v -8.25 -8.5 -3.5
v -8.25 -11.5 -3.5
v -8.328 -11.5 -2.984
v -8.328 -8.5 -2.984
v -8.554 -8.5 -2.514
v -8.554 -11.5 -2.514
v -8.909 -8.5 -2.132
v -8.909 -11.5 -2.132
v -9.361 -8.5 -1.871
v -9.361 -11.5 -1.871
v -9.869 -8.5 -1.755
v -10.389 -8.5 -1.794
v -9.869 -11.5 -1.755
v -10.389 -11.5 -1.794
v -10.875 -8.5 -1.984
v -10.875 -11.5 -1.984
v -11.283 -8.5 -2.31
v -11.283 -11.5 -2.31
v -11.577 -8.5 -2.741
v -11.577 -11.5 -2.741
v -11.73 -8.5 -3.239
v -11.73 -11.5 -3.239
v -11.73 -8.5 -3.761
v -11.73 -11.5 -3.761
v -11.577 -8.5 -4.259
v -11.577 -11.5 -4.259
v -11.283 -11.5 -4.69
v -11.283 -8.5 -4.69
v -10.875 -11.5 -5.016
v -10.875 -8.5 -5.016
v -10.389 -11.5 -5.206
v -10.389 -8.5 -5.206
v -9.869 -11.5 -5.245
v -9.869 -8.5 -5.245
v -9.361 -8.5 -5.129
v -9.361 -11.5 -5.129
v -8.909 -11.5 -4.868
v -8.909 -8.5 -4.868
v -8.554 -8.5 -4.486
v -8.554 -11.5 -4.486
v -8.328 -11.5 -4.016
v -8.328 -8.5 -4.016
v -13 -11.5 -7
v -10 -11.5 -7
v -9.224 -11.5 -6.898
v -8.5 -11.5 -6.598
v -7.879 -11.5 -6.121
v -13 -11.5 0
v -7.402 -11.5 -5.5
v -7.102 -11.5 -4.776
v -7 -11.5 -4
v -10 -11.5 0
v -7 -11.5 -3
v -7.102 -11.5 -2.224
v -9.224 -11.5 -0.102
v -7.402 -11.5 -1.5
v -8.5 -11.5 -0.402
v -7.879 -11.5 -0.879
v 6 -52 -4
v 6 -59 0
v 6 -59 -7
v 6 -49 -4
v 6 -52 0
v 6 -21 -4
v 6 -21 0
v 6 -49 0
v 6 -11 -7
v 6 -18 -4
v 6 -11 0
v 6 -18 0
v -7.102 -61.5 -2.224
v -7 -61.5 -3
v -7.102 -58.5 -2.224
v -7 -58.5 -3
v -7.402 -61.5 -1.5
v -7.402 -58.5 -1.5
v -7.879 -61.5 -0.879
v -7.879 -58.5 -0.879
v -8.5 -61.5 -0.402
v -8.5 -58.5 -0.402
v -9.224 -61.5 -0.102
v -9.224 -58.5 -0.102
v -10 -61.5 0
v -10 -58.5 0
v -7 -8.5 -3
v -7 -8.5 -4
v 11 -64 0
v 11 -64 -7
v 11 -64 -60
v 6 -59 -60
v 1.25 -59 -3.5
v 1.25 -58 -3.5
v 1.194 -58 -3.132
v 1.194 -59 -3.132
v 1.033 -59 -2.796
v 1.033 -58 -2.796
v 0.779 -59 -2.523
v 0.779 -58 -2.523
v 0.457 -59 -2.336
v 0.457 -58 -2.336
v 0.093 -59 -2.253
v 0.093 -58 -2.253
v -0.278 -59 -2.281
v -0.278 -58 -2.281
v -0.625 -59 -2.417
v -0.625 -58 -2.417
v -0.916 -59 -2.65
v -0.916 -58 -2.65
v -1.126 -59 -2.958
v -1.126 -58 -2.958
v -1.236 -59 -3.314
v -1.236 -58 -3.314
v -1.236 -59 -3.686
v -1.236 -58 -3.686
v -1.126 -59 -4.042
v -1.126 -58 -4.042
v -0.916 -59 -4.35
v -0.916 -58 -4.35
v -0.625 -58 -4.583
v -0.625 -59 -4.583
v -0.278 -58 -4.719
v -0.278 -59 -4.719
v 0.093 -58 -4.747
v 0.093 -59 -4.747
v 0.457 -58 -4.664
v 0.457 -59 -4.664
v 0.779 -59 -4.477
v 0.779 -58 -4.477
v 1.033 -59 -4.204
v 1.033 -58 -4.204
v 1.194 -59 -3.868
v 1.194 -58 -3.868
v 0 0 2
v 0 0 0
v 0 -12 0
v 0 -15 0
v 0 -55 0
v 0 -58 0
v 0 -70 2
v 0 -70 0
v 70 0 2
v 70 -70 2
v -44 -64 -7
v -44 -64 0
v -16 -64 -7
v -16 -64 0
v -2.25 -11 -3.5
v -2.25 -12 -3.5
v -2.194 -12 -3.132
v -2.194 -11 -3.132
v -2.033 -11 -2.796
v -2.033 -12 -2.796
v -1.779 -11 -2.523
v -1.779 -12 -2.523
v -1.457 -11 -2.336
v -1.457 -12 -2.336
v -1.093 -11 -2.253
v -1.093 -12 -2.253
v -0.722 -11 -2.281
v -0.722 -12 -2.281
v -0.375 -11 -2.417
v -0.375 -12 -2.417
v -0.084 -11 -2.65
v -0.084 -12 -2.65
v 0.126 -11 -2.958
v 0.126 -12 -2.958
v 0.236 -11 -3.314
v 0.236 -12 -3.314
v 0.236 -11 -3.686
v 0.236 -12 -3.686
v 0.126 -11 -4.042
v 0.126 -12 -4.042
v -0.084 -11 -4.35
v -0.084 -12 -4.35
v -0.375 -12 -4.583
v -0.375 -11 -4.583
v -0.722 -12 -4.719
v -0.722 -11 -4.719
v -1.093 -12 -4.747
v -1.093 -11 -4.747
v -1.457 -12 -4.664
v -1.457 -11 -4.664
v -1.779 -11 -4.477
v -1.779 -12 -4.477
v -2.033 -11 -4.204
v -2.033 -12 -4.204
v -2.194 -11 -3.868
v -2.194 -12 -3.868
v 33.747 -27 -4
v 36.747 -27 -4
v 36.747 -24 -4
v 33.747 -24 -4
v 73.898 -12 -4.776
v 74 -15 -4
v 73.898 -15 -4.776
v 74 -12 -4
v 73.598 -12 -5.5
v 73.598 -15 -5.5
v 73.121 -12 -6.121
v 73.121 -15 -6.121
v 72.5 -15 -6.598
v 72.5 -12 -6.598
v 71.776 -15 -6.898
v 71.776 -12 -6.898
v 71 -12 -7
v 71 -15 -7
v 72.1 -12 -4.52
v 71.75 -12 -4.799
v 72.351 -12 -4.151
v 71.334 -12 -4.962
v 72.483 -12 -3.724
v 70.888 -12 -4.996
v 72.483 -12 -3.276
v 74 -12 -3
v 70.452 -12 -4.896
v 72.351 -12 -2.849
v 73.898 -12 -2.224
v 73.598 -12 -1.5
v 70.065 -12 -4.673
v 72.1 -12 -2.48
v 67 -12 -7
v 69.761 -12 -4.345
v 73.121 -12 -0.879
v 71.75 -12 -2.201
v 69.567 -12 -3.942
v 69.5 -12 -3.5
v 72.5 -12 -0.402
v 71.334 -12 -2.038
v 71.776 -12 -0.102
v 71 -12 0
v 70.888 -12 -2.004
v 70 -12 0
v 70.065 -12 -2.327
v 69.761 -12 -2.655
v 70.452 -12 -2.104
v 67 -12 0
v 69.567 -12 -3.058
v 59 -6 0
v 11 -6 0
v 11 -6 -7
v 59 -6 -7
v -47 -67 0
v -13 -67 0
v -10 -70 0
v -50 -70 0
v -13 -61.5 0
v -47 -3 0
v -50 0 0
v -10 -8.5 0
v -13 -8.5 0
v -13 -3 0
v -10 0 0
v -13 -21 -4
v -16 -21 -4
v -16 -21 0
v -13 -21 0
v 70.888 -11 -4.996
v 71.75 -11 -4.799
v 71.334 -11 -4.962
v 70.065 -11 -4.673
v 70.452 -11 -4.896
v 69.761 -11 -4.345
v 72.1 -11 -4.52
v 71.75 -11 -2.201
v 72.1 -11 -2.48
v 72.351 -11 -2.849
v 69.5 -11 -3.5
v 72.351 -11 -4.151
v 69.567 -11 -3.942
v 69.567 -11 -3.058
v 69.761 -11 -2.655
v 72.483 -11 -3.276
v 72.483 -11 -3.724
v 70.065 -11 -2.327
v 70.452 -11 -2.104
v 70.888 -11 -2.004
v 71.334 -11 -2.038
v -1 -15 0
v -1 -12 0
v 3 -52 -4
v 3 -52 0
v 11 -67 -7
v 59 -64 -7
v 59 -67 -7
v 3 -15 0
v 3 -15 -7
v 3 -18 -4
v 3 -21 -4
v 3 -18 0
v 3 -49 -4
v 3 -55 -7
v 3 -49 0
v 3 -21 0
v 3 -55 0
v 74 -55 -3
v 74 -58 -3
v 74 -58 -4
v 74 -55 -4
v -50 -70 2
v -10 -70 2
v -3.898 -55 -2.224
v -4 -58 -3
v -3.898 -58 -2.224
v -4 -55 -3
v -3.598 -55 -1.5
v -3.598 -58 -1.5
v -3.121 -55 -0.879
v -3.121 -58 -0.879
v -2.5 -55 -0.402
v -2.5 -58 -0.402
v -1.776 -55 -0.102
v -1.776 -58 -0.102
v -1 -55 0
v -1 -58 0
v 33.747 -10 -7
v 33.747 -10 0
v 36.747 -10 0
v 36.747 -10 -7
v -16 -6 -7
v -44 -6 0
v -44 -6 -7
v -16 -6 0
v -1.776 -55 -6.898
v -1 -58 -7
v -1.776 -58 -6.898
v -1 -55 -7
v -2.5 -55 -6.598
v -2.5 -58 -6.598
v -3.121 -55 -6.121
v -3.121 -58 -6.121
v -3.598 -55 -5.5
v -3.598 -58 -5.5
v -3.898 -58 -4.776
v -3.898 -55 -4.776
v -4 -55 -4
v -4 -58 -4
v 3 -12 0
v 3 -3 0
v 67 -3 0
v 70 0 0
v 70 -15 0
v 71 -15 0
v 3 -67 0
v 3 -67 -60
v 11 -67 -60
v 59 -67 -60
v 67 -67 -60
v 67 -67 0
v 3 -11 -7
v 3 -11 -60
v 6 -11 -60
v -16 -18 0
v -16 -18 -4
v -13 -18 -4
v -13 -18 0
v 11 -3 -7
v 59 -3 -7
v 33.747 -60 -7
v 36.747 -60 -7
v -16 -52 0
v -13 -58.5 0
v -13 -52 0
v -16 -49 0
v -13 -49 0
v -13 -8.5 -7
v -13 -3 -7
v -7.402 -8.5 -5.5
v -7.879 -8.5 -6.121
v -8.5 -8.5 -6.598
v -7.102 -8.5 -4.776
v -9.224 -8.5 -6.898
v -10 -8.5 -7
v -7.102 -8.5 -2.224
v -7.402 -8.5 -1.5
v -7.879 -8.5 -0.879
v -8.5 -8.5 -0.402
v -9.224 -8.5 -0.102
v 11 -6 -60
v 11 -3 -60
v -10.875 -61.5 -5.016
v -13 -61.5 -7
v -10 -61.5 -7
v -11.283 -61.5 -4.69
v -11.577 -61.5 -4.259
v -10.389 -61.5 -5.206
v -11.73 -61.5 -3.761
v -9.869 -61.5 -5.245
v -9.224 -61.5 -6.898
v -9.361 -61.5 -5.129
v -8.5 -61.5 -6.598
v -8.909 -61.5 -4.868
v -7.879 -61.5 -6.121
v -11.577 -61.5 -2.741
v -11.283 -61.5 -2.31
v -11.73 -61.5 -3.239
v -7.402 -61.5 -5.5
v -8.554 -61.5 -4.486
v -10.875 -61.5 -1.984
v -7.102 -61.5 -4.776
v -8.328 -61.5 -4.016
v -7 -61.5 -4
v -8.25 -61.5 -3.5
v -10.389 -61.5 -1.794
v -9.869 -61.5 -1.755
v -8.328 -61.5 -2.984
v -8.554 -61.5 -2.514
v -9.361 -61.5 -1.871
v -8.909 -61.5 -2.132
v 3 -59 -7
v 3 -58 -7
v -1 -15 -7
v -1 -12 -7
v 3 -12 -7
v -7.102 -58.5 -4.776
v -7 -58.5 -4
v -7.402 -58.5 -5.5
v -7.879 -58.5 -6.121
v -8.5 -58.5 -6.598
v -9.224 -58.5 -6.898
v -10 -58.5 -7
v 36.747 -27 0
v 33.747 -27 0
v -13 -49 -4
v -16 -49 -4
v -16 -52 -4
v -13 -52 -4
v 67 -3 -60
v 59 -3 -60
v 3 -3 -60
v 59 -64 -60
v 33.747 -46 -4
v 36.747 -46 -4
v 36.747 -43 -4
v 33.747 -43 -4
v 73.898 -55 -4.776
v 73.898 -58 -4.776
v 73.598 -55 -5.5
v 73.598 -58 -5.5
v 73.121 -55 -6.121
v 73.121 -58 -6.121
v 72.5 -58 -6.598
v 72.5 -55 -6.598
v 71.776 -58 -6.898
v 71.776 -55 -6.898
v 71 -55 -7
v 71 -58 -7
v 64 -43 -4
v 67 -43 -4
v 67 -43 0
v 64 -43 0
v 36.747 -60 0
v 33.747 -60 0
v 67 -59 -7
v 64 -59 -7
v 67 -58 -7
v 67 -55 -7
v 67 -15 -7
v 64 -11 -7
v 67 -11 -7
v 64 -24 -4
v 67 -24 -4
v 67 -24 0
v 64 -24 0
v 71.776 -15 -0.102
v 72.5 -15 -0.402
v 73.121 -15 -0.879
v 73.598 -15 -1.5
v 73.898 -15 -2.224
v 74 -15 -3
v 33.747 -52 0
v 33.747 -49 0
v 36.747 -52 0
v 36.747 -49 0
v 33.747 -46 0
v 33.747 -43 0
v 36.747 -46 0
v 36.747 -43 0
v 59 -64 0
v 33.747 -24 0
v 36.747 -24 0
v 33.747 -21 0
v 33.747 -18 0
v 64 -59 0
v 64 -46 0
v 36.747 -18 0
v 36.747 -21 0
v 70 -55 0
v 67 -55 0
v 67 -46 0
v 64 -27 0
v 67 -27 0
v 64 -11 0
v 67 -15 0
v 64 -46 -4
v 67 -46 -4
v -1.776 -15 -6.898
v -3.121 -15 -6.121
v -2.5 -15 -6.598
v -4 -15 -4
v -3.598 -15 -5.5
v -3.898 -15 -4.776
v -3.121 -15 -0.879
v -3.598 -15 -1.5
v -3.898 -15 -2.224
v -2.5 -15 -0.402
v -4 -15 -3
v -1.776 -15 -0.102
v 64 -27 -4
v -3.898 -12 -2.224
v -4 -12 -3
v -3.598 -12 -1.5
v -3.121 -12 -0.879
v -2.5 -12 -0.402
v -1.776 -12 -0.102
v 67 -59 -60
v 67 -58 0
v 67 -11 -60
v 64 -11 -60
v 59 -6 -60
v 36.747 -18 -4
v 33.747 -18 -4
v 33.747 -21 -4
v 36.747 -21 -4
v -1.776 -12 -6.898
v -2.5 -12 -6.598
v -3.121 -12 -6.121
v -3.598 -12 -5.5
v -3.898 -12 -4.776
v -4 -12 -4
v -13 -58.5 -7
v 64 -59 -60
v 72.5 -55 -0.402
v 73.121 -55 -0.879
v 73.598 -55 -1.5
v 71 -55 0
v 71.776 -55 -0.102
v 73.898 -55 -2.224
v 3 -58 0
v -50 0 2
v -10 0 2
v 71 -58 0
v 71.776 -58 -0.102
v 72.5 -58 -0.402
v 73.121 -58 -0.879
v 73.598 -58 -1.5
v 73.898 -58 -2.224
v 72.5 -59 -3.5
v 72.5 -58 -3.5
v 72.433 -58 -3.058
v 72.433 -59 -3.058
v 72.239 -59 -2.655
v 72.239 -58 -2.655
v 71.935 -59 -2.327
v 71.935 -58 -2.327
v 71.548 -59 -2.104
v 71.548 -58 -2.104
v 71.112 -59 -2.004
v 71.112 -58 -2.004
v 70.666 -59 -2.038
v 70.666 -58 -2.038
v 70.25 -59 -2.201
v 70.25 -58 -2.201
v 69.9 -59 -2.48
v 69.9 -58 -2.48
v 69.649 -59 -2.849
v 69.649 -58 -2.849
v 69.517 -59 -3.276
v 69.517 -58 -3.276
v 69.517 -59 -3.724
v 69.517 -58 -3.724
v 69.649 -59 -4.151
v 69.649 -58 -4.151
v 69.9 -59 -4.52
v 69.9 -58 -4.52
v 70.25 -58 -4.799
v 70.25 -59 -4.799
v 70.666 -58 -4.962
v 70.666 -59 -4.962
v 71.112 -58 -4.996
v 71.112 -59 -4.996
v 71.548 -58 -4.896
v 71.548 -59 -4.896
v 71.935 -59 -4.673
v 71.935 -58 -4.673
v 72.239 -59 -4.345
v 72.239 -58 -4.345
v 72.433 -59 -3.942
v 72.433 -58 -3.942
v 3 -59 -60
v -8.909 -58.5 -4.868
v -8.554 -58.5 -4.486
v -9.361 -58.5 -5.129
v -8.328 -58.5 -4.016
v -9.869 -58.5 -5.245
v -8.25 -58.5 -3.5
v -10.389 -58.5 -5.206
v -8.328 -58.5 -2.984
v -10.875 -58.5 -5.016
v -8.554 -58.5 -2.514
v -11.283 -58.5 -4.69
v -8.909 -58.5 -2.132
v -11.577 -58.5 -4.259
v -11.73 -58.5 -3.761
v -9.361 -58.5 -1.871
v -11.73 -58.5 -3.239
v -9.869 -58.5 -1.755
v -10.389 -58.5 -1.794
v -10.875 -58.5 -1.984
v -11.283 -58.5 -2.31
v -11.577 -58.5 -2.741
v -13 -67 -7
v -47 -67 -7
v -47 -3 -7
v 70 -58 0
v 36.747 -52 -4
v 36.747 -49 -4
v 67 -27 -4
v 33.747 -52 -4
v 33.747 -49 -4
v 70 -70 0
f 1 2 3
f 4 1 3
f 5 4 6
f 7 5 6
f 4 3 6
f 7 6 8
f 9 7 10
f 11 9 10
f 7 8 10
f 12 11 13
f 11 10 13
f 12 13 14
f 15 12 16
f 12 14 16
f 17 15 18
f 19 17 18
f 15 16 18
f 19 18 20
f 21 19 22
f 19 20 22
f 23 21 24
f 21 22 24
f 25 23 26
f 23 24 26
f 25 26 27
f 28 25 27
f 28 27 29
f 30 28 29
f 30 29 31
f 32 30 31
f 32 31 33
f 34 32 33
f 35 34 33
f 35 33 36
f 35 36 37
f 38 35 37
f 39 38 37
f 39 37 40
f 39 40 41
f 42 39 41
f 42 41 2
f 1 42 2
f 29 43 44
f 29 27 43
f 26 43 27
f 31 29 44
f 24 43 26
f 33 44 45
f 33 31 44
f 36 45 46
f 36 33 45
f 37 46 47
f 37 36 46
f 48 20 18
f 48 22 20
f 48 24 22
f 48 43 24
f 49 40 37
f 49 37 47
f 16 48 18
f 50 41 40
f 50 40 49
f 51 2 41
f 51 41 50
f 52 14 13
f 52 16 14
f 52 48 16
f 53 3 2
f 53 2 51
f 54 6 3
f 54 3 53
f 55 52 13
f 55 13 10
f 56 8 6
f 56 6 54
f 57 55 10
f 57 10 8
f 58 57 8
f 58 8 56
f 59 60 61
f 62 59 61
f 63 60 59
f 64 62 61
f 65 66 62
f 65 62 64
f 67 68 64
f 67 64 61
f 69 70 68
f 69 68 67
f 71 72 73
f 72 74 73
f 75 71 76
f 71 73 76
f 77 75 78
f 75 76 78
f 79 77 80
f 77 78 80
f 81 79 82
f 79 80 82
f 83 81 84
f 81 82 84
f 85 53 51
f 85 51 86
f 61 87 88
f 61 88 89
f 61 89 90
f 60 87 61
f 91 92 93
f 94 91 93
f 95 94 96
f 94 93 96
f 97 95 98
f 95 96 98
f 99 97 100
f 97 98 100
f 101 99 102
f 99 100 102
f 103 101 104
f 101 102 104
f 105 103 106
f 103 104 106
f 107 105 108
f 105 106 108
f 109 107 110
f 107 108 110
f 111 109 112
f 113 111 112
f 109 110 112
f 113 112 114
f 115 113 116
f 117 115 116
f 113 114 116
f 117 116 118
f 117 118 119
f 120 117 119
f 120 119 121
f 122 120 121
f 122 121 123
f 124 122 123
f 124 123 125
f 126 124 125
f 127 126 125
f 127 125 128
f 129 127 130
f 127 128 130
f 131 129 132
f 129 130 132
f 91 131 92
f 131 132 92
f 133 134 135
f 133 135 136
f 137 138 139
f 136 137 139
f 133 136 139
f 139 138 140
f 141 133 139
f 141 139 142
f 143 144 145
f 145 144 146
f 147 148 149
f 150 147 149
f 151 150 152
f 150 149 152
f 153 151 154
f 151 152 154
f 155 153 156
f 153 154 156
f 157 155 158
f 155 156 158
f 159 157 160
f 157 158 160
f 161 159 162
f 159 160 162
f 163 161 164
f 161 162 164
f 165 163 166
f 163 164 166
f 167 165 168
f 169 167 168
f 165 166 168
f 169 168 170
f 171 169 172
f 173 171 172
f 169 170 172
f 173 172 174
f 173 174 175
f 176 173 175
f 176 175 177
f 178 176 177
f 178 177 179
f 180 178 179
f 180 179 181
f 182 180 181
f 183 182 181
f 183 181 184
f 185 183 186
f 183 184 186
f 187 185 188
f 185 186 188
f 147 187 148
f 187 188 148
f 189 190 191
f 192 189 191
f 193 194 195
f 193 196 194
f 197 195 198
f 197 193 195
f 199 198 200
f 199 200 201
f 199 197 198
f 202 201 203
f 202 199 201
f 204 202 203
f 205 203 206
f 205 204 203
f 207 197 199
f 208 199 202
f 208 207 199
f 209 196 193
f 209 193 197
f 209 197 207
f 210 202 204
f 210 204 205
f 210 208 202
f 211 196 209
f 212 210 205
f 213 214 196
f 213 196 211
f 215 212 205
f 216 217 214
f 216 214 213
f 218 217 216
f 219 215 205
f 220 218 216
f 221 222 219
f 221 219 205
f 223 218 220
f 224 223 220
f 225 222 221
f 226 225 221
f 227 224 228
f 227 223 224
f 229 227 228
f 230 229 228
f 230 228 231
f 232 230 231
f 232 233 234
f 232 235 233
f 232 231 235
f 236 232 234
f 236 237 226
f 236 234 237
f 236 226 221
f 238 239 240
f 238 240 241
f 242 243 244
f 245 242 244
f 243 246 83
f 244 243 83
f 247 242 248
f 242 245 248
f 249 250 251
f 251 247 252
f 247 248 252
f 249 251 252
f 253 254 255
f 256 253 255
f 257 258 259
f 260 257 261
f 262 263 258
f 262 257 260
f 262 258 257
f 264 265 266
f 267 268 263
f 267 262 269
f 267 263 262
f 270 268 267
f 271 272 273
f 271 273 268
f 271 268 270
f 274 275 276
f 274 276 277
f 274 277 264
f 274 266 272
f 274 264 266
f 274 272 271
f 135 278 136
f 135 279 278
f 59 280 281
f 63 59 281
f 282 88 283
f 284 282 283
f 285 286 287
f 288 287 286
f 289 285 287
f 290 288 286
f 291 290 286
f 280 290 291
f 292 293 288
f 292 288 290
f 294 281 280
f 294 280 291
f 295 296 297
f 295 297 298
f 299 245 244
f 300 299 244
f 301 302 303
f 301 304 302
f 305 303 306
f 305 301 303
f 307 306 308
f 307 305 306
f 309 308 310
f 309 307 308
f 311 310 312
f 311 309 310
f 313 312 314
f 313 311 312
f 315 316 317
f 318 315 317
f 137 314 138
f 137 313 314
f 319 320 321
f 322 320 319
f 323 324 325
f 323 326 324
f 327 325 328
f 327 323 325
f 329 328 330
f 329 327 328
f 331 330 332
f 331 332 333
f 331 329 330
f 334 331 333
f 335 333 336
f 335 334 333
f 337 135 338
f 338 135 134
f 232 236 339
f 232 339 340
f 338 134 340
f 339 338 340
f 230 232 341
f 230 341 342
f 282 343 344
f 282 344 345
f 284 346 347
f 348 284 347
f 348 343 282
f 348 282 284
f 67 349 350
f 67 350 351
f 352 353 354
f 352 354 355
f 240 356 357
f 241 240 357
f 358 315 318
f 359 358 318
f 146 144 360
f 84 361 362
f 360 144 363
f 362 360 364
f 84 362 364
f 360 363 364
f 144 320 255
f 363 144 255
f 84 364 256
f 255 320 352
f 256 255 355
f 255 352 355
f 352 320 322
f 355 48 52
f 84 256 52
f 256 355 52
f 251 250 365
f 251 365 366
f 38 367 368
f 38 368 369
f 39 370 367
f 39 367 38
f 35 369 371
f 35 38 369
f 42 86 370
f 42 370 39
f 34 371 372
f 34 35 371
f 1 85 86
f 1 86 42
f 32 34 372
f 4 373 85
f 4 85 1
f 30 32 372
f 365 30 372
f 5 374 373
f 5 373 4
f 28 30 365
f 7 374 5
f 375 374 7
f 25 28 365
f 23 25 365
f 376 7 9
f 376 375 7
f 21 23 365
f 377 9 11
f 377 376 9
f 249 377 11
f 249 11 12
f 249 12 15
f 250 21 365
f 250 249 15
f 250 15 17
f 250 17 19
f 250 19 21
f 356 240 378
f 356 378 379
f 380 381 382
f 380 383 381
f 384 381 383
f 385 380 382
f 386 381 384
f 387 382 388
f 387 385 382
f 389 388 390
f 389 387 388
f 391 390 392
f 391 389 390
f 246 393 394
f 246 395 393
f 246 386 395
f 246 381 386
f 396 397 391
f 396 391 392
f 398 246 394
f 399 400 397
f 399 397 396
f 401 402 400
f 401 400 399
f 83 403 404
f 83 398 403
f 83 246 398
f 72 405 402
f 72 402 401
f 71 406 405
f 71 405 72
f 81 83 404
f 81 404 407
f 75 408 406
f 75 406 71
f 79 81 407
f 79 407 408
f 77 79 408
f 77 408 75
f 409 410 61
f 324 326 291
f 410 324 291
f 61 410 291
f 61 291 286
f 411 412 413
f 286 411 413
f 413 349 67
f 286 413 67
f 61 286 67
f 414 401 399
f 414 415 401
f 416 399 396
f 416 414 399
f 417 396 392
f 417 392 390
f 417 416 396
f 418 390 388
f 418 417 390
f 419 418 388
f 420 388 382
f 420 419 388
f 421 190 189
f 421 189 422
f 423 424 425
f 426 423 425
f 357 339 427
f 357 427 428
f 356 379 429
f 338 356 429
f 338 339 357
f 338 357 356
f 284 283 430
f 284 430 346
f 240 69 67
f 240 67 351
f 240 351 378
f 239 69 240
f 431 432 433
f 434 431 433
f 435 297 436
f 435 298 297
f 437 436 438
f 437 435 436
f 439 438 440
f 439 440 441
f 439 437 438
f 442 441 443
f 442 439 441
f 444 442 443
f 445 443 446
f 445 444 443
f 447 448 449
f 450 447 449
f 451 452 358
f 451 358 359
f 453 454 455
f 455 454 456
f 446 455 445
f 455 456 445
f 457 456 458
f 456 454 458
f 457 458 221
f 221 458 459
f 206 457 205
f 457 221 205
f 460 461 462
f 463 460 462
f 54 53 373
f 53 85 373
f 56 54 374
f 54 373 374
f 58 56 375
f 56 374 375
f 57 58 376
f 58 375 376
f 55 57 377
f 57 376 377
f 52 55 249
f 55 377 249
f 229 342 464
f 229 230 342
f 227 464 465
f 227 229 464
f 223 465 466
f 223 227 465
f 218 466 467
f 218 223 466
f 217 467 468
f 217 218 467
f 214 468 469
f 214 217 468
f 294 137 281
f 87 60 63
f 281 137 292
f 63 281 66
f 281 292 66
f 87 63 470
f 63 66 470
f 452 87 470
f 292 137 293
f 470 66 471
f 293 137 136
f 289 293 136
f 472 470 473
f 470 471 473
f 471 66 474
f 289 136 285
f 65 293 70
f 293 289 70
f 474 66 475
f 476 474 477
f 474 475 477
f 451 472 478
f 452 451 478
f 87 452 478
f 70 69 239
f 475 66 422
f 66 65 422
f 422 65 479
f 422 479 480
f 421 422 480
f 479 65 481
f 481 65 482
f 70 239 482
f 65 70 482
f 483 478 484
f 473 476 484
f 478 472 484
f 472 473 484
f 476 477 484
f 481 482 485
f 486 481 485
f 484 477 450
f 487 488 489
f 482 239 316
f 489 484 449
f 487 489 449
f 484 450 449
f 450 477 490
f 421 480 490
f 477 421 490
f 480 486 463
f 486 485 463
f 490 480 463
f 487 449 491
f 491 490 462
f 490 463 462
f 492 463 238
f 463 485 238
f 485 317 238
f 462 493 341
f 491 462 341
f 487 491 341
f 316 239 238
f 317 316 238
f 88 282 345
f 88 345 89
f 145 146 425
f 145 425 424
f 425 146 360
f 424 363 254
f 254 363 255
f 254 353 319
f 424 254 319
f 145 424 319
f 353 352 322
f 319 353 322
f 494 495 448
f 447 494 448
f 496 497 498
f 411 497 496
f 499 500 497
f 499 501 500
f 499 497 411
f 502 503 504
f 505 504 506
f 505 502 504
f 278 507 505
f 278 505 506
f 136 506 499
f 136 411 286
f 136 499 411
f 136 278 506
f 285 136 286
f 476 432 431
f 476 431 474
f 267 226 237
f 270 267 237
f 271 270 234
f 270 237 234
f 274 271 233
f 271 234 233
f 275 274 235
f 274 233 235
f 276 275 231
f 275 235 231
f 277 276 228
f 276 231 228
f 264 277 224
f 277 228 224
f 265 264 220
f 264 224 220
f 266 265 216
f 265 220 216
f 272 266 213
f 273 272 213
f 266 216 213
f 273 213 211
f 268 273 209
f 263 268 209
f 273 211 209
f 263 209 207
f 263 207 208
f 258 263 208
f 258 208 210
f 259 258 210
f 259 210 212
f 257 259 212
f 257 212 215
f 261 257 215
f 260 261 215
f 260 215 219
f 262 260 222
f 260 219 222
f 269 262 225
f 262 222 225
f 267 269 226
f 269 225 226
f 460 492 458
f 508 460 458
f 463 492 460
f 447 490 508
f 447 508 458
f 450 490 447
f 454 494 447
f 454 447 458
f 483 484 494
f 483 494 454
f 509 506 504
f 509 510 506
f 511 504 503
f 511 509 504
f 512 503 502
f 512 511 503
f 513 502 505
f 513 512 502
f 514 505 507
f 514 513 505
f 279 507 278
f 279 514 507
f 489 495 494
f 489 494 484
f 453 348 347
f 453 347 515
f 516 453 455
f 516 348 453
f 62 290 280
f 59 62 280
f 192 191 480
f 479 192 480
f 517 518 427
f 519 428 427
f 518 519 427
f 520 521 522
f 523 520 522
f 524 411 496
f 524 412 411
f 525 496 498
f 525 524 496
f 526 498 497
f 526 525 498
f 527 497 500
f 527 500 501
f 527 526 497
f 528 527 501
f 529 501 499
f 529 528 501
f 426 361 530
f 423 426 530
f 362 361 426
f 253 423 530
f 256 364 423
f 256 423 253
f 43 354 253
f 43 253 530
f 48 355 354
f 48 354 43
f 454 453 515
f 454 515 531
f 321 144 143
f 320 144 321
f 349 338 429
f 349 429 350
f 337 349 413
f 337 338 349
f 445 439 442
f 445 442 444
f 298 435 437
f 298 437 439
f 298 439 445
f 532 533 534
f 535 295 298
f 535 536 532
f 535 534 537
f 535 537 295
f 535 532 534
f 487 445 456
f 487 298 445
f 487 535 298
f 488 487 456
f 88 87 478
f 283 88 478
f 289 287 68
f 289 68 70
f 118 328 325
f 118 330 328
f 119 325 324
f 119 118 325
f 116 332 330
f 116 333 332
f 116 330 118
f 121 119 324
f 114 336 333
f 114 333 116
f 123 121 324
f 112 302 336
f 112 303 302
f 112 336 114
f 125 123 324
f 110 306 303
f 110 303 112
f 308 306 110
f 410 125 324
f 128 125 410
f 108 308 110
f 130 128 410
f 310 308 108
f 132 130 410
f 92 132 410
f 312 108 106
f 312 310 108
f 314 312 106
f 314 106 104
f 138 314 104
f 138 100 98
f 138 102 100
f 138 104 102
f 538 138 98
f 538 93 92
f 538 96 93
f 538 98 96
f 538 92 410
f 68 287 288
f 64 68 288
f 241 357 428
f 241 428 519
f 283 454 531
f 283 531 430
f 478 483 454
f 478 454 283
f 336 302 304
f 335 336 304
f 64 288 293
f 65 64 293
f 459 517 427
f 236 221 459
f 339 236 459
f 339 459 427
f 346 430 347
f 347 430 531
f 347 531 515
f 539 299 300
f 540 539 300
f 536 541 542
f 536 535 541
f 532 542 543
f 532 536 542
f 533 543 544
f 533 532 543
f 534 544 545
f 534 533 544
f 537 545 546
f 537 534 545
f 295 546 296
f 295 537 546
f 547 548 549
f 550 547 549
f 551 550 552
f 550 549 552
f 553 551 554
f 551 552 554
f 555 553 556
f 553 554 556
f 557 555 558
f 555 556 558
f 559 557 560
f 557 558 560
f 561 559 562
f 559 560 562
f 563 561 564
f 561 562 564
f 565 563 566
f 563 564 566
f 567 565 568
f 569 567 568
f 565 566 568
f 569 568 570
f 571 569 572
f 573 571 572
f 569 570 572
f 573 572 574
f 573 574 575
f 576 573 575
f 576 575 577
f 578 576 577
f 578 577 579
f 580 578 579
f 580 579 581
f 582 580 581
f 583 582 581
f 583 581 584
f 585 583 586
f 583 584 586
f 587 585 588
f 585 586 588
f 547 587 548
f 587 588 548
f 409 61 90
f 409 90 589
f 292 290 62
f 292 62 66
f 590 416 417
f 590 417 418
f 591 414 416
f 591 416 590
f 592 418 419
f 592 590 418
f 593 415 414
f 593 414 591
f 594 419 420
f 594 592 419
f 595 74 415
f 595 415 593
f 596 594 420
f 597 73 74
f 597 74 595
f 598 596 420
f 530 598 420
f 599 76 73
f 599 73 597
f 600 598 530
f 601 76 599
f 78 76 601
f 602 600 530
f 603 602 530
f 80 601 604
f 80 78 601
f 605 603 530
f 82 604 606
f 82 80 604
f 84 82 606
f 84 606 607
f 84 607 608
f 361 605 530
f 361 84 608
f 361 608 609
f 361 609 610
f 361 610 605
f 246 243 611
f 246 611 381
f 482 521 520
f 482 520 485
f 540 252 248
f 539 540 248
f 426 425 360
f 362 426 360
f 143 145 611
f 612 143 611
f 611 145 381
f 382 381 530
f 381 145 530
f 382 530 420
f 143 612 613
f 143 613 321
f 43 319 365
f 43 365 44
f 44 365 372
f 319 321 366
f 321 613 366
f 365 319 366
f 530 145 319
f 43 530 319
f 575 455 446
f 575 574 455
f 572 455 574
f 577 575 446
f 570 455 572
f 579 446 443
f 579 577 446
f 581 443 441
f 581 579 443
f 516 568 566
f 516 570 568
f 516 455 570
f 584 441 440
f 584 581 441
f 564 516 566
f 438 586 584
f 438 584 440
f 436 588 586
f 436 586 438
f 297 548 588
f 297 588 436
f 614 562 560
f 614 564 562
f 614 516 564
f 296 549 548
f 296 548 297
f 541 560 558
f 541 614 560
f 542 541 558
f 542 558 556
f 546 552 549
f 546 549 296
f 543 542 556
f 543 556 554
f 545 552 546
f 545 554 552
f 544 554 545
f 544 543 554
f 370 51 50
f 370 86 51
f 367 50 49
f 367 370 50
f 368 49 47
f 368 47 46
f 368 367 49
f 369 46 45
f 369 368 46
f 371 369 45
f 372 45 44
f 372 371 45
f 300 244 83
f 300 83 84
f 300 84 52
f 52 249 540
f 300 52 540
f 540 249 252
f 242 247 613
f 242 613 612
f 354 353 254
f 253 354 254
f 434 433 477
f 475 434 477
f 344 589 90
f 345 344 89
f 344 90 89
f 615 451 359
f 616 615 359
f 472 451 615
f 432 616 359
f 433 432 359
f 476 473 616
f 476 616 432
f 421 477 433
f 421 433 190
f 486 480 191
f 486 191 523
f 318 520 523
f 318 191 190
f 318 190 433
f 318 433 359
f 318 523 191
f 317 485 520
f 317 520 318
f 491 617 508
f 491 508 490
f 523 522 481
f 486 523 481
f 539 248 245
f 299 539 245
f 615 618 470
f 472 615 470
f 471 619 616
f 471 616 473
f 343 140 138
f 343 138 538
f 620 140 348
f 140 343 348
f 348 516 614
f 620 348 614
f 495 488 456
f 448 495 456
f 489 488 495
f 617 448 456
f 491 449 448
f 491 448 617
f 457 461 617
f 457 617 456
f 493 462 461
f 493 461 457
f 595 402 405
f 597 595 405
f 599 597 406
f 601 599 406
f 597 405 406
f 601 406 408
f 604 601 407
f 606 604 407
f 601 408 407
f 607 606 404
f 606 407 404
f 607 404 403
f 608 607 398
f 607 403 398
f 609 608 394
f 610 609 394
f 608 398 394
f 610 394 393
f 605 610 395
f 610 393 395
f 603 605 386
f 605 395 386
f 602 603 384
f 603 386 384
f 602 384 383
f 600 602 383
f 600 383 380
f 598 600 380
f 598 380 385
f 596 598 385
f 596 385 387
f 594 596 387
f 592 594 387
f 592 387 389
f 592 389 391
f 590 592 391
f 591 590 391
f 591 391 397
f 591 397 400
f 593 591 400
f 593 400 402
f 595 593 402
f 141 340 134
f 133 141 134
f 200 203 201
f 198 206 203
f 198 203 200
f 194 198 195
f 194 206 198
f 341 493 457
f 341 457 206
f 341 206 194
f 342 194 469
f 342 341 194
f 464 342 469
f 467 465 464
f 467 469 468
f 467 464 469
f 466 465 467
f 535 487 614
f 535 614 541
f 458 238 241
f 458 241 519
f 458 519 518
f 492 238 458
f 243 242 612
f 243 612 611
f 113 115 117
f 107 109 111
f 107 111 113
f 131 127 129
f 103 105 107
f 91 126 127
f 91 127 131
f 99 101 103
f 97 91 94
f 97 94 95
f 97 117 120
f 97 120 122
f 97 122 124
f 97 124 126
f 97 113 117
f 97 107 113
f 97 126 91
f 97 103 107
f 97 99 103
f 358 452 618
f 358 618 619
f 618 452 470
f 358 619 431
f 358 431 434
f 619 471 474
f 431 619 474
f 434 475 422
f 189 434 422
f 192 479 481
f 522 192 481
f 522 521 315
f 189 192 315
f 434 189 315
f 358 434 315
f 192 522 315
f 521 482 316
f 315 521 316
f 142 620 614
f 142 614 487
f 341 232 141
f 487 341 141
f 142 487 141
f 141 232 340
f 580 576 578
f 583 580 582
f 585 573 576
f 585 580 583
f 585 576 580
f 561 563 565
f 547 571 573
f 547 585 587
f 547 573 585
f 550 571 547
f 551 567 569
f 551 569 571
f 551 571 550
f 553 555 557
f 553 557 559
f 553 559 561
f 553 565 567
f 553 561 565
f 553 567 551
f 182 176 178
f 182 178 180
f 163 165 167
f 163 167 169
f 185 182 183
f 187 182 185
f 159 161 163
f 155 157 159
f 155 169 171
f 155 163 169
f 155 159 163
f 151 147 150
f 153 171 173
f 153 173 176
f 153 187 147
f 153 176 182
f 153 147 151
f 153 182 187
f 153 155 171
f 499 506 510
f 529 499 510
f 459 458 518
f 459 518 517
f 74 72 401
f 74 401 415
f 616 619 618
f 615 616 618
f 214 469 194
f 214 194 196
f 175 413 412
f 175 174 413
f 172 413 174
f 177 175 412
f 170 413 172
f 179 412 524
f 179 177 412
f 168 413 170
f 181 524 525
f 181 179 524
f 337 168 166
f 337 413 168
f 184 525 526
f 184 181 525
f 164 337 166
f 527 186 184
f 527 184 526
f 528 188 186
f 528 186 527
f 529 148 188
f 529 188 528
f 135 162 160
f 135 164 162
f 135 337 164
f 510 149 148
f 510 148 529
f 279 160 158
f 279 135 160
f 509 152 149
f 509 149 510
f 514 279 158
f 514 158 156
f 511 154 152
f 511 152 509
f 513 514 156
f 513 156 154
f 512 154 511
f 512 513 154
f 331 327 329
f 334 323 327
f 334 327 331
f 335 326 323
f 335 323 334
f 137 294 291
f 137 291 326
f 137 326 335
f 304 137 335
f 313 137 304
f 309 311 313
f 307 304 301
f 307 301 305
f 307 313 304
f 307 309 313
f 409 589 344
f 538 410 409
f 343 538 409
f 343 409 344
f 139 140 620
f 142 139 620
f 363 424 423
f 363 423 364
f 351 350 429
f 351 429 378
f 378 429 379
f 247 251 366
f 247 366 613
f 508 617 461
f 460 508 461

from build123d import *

# Parameters (mm, degrees)
F0_W      = 3
F0_H      = 50
F0_W_2    = 48
F0_H_2    = 3
F0_H_3    = 40
F1_DEPTH  = 2
F2_DEPTH  = 60
F0_W_3    = 4
F3_DEPTH  = 7
F4_R      = 1.25
F4_R_2    = 1.5
F5_DEPTH  = 1
F6_R      = 1.25
F6_R_2    = 1.5
F7_DEPTH  = 1
F8_W      = 28
F8_H      = 58
F8_W_2    = 3
F8_H_2    = 47
F8_H_3    = 3
F9_DEPTH  = 2
F10_DEPTH = 7
F11_DEPTH = 7
F12_R     = 1.75
F13_DEPTH = 61.501
F14_W     = 3
F14_H     = 4
F15_DEPTH = 52.7474034429
F16_R     = 3
F16_2_R   = 3
F17_R     = 2.99999
F17_2_R   = 2.99999
F18_W     = 3
F18_H     = 4
F19_DEPTH = 33.2525965571


# Not quite as in the source:
# - a fillet or chamfer is up to 0.001 mm smaller than in the source, because OpenCascade refuses the exact size


with BuildPart() as f1:
    # F0 (on Top) → F1 (new body)
    with BuildSketch(Plane.XY):
        Polygon((11, -6), (6, -11), (6, -59), (11, -64), (59, -64), (64, -59), (64, -11), (59, -6), align=None)
        with Locations((35.2474034429, -35)):
            Rectangle(F0_W, F0_H, mode=Mode.SUBTRACT)
        Polygon((67, -15), (67, -12), (67, -11), (64, -11), (64, -59), (67, -59), (67, -58), (67, -55), align=None)
        Polygon((70, 0), (0, 0), (0, -12), (3, -12), (3, -11), (3, -3), (11, -3), (59, -3), (67, -3), (67, -11), (67, -12), (70, -12), align=None)
        Polygon((3, -11), (3, -12), (3, -15), (3, -55), (3, -58), (3, -59), (6, -59), (6, -11), align=None)
        with Locations((35, -65.5)):
            Rectangle(F0_W_2, F0_H_2)
        Polygon((67, -59), (64, -59), (59, -64), (59, -67), (67, -67), align=None)
        Polygon((11, -64), (6, -59), (3, -59), (3, -67), (11, -67), align=None)
        Polygon((64, -11), (67, -11), (67, -3), (59, -3), (59, -6), align=None)
        with Locations((35, -4.5)):
            Rectangle(F0_W_2, F0_H_2)
        Polygon((3, -3), (3, -11), (6, -11), (11, -6), (11, -3), align=None)
        with Locations((68.5, -35)):
            Rectangle(F0_W, F0_H_3)
        with Locations((68.5, -13.5)):
            Rectangle(F0_W, F0_H_2)
        with Locations((68.5, -56.5)):
            Rectangle(F0_W, F0_H_2)
        Polygon((3, -58), (0, -58), (0, -70), (70, -70), (70, -58), (67, -58), (67, -59), (67, -67), (59, -67), (11, -67), (3, -67), (3, -59), align=None)
        with Locations((1.5, -35)):
            Rectangle(F0_W, F0_H_3)
        with Locations((1.5, -56.5)):
            Rectangle(F0_W, F0_H_2)
        with Locations((1.5, -13.5)):
            Rectangle(F0_W, F0_H_2)
        with Locations((35.2474034429, -35)):
            Rectangle(F0_W, F0_H)
    extrude(amount=F1_DEPTH)

    # F0 (on Top) → F2 (join)
    with BuildSketch(Plane.XY):
        Polygon((67, -59), (64, -59), (59, -64), (59, -67), (67, -67), align=None)
        Polygon((64, -11), (67, -11), (67, -3), (59, -3), (59, -6), align=None)
        Polygon((3, -3), (3, -11), (6, -11), (11, -6), (11, -3), align=None)
        Polygon((11, -64), (6, -59), (3, -59), (3, -67), (11, -67), align=None)
    extrude(amount=-F2_DEPTH)

    # F0 (on Top) → F3 (join)
    with BuildSketch(Plane.XY):
        Polygon((3, -11), (3, -12), (3, -15), (3, -55), (3, -58), (3, -59), (6, -59), (6, -11), align=None)
        with Locations((-2, -56.5)):
            Rectangle(F0_W_3, F0_H_2)
        with Locations((1.5, -56.5)):
            Rectangle(F0_W, F0_H_2)
        with Locations((1.5, -13.5)):
            Rectangle(F0_W, F0_H_2)
        with Locations((-2, -13.5)):
            Rectangle(F0_W_3, F0_H_2)
        with Locations((35, -65.5)):
            Rectangle(F0_W_2, F0_H_2)
        Polygon((67, -15), (67, -12), (67, -11), (64, -11), (64, -59), (67, -59), (67, -58), (67, -55), align=None)
        with Locations((68.5, -56.5)):
            Rectangle(F0_W, F0_H_2)
        with Locations((72, -56.5)):
            Rectangle(F0_W_3, F0_H_2)
        with Locations((72, -13.5)):
            Rectangle(F0_W_3, F0_H_2)
        with Locations((68.5, -13.5)):
            Rectangle(F0_W, F0_H_2)
        with Locations((35, -4.5)):
            Rectangle(F0_W_2, F0_H_2)
        with Locations((35.2474034429, -35)):
            Rectangle(F0_W, F0_H)
    extrude(amount=-F3_DEPTH)

    # F4 (on face) → F5 (join)
    with BuildSketch(Plane(origin=(0, -12, 0), x_dir=(-1, 0, 0), z_dir=(0, 1, 0))):
        with Locations((1, -3.5)):
            Circle(F4_R)
        with Locations((-71, -3.5)):
            Circle(F4_R_2)
    extrude(amount=F5_DEPTH)

    # F6 (on face) → F7 (join)
    with BuildSketch(Plane.XZ.offset(58)):
        with Locations((0, -3.5)):
            Circle(F6_R)
        with Locations((71, -3.5)):
            Circle(F6_R_2)
    extrude(amount=F7_DEPTH)


with BuildPart() as f9:
    # F8 (on Top) → F9 (new body)
    with BuildSketch(Plane.XY):
        Polygon((-13, -11.5), (-13, -8.5), (-13, -3), (-47, -3), (-47, -67), (-13, -67), (-13, -61.5), (-13, -58.5), align=None)
        with Locations((-30, -35)):
            Rectangle(F8_W, F8_H, mode=Mode.SUBTRACT)
        with Locations((-30, -35)):
            Rectangle(F8_W, F8_H)
        Polygon((-10, -8.5), (-10, 0), (-50, 0), (-50, -70), (-10, -70), (-10, -61.5), (-13, -61.5), (-13, -67), (-47, -67), (-47, -3), (-13, -3), (-13, -8.5), align=None)
        with Locations((-11.5, -35)):
            Rectangle(F8_W_2, F8_H_2)
        with Locations((-11.5, -60)):
            Rectangle(F8_W_2, F8_H_3)
        with Locations((-11.5, -10)):
            Rectangle(F8_W_2, F8_H_3)
    extrude(amount=F9_DEPTH)

    # F8 (on Top) → F10 (join)
    with BuildSketch(Plane.XY):
        Polygon((-13, -11.5), (-13, -8.5), (-13, -3), (-47, -3), (-47, -67), (-13, -67), (-13, -61.5), (-13, -58.5), align=None)
        with Locations((-30, -35)):
            Rectangle(F8_W, F8_H, mode=Mode.SUBTRACT)
    extrude(amount=-F10_DEPTH)

    # F8 (on Top) → F11 (join)
    with BuildSketch(Plane.XY):
        with Locations((-11.5, -60)):
            Rectangle(F8_W_2, F8_H_3)
        with Locations((-8.5, -60)):
            Rectangle(F8_W_2, F8_H_3)
        with Locations((-8.5, -10)):
            Rectangle(F8_W_2, F8_H_3)
        with Locations((-11.5, -10)):
            Rectangle(F8_W_2, F8_H_3)
    extrude(amount=-F11_DEPTH)

    # F12 (on face) → F13 (cut, through all)
    with BuildSketch(Plane.XZ.offset(61.5)):
        with Locations((-10, -3.5)):
            Circle(F12_R)
    extrude(amount=-F13_DEPTH, mode=Mode.SUBTRACT)


with BuildPart() as f15_tool:
    # F14 (on face) → F15 (new body, through all)
    with BuildSketch(Plane(origin=(-16, 0, 0), x_dir=(0, -1, 0), z_dir=(-1, 0, 0))):
        with Locations((50.5, -2)):
            Rectangle(F14_W, F14_H)
        with Locations((19.5, -2)):
            Rectangle(F14_W, F14_H)
    extrude(amount=-F15_DEPTH)


with BuildPart() as f1_1:
    add(f1.part)

    # F15: cut by f15_tool
    add(f15_tool.part, mode=Mode.SUBTRACT)

    # F16#2
    f16_2_edges = [f1_1.edges().sort_by_distance(p)[0] for p in [
        (-4, -13.5, -7),
        (-4, -56.5, -7),
        (74, -13.5, -7),
        (74, -56.5, -7),
    ]]
    fillet(f16_2_edges, radius=F16_2_R)

    # F17 (radius 3 in the source; OpenCascade refuses exactly that, so slightly less here)
    f17_edges = [f1_1.edges().sort_by_distance(p)[0] for p in [
        (-4, -13.5, 0),
        (-4, -56.5, 0),
        (74, -13.5, 0),
        (74, -56.5, 0),
    ]]
    fillet(f17_edges, radius=F17_R)

    # F18 (on face) → F19 (cut, through all)
    with BuildSketch(Plane.YZ.offset(67)):
        with Locations((-44.5, -2)):
            Rectangle(F18_W, F18_H)
        with Locations((-25.5, -2)):
            Rectangle(F18_W, F18_H)
    extrude(amount=-F19_DEPTH, mode=Mode.SUBTRACT)


with BuildPart() as f9_1:
    add(f9.part)

    # F15: cut by f15_tool
    add(f15_tool.part, mode=Mode.SUBTRACT)

    # F16
    f16_edges = [f9_1.edges().sort_by_distance(p)[0] for p in [
        (-7, -10, -7),
        (-7, -60, -7),
    ]]
    fillet(f16_edges, radius=F16_R)

    # F17#2 (radius 3 in the source; OpenCascade refuses exactly that, so slightly less here)
    f17_2_edges = [f9_1.edges().sort_by_distance(p)[0] for p in [
        (-7, -60, 0),
        (-7, -10, 0),
    ]]
    fillet(f17_2_edges, radius=F17_2_R)


solid = Compound([f1_1.part, f9_1.part])
